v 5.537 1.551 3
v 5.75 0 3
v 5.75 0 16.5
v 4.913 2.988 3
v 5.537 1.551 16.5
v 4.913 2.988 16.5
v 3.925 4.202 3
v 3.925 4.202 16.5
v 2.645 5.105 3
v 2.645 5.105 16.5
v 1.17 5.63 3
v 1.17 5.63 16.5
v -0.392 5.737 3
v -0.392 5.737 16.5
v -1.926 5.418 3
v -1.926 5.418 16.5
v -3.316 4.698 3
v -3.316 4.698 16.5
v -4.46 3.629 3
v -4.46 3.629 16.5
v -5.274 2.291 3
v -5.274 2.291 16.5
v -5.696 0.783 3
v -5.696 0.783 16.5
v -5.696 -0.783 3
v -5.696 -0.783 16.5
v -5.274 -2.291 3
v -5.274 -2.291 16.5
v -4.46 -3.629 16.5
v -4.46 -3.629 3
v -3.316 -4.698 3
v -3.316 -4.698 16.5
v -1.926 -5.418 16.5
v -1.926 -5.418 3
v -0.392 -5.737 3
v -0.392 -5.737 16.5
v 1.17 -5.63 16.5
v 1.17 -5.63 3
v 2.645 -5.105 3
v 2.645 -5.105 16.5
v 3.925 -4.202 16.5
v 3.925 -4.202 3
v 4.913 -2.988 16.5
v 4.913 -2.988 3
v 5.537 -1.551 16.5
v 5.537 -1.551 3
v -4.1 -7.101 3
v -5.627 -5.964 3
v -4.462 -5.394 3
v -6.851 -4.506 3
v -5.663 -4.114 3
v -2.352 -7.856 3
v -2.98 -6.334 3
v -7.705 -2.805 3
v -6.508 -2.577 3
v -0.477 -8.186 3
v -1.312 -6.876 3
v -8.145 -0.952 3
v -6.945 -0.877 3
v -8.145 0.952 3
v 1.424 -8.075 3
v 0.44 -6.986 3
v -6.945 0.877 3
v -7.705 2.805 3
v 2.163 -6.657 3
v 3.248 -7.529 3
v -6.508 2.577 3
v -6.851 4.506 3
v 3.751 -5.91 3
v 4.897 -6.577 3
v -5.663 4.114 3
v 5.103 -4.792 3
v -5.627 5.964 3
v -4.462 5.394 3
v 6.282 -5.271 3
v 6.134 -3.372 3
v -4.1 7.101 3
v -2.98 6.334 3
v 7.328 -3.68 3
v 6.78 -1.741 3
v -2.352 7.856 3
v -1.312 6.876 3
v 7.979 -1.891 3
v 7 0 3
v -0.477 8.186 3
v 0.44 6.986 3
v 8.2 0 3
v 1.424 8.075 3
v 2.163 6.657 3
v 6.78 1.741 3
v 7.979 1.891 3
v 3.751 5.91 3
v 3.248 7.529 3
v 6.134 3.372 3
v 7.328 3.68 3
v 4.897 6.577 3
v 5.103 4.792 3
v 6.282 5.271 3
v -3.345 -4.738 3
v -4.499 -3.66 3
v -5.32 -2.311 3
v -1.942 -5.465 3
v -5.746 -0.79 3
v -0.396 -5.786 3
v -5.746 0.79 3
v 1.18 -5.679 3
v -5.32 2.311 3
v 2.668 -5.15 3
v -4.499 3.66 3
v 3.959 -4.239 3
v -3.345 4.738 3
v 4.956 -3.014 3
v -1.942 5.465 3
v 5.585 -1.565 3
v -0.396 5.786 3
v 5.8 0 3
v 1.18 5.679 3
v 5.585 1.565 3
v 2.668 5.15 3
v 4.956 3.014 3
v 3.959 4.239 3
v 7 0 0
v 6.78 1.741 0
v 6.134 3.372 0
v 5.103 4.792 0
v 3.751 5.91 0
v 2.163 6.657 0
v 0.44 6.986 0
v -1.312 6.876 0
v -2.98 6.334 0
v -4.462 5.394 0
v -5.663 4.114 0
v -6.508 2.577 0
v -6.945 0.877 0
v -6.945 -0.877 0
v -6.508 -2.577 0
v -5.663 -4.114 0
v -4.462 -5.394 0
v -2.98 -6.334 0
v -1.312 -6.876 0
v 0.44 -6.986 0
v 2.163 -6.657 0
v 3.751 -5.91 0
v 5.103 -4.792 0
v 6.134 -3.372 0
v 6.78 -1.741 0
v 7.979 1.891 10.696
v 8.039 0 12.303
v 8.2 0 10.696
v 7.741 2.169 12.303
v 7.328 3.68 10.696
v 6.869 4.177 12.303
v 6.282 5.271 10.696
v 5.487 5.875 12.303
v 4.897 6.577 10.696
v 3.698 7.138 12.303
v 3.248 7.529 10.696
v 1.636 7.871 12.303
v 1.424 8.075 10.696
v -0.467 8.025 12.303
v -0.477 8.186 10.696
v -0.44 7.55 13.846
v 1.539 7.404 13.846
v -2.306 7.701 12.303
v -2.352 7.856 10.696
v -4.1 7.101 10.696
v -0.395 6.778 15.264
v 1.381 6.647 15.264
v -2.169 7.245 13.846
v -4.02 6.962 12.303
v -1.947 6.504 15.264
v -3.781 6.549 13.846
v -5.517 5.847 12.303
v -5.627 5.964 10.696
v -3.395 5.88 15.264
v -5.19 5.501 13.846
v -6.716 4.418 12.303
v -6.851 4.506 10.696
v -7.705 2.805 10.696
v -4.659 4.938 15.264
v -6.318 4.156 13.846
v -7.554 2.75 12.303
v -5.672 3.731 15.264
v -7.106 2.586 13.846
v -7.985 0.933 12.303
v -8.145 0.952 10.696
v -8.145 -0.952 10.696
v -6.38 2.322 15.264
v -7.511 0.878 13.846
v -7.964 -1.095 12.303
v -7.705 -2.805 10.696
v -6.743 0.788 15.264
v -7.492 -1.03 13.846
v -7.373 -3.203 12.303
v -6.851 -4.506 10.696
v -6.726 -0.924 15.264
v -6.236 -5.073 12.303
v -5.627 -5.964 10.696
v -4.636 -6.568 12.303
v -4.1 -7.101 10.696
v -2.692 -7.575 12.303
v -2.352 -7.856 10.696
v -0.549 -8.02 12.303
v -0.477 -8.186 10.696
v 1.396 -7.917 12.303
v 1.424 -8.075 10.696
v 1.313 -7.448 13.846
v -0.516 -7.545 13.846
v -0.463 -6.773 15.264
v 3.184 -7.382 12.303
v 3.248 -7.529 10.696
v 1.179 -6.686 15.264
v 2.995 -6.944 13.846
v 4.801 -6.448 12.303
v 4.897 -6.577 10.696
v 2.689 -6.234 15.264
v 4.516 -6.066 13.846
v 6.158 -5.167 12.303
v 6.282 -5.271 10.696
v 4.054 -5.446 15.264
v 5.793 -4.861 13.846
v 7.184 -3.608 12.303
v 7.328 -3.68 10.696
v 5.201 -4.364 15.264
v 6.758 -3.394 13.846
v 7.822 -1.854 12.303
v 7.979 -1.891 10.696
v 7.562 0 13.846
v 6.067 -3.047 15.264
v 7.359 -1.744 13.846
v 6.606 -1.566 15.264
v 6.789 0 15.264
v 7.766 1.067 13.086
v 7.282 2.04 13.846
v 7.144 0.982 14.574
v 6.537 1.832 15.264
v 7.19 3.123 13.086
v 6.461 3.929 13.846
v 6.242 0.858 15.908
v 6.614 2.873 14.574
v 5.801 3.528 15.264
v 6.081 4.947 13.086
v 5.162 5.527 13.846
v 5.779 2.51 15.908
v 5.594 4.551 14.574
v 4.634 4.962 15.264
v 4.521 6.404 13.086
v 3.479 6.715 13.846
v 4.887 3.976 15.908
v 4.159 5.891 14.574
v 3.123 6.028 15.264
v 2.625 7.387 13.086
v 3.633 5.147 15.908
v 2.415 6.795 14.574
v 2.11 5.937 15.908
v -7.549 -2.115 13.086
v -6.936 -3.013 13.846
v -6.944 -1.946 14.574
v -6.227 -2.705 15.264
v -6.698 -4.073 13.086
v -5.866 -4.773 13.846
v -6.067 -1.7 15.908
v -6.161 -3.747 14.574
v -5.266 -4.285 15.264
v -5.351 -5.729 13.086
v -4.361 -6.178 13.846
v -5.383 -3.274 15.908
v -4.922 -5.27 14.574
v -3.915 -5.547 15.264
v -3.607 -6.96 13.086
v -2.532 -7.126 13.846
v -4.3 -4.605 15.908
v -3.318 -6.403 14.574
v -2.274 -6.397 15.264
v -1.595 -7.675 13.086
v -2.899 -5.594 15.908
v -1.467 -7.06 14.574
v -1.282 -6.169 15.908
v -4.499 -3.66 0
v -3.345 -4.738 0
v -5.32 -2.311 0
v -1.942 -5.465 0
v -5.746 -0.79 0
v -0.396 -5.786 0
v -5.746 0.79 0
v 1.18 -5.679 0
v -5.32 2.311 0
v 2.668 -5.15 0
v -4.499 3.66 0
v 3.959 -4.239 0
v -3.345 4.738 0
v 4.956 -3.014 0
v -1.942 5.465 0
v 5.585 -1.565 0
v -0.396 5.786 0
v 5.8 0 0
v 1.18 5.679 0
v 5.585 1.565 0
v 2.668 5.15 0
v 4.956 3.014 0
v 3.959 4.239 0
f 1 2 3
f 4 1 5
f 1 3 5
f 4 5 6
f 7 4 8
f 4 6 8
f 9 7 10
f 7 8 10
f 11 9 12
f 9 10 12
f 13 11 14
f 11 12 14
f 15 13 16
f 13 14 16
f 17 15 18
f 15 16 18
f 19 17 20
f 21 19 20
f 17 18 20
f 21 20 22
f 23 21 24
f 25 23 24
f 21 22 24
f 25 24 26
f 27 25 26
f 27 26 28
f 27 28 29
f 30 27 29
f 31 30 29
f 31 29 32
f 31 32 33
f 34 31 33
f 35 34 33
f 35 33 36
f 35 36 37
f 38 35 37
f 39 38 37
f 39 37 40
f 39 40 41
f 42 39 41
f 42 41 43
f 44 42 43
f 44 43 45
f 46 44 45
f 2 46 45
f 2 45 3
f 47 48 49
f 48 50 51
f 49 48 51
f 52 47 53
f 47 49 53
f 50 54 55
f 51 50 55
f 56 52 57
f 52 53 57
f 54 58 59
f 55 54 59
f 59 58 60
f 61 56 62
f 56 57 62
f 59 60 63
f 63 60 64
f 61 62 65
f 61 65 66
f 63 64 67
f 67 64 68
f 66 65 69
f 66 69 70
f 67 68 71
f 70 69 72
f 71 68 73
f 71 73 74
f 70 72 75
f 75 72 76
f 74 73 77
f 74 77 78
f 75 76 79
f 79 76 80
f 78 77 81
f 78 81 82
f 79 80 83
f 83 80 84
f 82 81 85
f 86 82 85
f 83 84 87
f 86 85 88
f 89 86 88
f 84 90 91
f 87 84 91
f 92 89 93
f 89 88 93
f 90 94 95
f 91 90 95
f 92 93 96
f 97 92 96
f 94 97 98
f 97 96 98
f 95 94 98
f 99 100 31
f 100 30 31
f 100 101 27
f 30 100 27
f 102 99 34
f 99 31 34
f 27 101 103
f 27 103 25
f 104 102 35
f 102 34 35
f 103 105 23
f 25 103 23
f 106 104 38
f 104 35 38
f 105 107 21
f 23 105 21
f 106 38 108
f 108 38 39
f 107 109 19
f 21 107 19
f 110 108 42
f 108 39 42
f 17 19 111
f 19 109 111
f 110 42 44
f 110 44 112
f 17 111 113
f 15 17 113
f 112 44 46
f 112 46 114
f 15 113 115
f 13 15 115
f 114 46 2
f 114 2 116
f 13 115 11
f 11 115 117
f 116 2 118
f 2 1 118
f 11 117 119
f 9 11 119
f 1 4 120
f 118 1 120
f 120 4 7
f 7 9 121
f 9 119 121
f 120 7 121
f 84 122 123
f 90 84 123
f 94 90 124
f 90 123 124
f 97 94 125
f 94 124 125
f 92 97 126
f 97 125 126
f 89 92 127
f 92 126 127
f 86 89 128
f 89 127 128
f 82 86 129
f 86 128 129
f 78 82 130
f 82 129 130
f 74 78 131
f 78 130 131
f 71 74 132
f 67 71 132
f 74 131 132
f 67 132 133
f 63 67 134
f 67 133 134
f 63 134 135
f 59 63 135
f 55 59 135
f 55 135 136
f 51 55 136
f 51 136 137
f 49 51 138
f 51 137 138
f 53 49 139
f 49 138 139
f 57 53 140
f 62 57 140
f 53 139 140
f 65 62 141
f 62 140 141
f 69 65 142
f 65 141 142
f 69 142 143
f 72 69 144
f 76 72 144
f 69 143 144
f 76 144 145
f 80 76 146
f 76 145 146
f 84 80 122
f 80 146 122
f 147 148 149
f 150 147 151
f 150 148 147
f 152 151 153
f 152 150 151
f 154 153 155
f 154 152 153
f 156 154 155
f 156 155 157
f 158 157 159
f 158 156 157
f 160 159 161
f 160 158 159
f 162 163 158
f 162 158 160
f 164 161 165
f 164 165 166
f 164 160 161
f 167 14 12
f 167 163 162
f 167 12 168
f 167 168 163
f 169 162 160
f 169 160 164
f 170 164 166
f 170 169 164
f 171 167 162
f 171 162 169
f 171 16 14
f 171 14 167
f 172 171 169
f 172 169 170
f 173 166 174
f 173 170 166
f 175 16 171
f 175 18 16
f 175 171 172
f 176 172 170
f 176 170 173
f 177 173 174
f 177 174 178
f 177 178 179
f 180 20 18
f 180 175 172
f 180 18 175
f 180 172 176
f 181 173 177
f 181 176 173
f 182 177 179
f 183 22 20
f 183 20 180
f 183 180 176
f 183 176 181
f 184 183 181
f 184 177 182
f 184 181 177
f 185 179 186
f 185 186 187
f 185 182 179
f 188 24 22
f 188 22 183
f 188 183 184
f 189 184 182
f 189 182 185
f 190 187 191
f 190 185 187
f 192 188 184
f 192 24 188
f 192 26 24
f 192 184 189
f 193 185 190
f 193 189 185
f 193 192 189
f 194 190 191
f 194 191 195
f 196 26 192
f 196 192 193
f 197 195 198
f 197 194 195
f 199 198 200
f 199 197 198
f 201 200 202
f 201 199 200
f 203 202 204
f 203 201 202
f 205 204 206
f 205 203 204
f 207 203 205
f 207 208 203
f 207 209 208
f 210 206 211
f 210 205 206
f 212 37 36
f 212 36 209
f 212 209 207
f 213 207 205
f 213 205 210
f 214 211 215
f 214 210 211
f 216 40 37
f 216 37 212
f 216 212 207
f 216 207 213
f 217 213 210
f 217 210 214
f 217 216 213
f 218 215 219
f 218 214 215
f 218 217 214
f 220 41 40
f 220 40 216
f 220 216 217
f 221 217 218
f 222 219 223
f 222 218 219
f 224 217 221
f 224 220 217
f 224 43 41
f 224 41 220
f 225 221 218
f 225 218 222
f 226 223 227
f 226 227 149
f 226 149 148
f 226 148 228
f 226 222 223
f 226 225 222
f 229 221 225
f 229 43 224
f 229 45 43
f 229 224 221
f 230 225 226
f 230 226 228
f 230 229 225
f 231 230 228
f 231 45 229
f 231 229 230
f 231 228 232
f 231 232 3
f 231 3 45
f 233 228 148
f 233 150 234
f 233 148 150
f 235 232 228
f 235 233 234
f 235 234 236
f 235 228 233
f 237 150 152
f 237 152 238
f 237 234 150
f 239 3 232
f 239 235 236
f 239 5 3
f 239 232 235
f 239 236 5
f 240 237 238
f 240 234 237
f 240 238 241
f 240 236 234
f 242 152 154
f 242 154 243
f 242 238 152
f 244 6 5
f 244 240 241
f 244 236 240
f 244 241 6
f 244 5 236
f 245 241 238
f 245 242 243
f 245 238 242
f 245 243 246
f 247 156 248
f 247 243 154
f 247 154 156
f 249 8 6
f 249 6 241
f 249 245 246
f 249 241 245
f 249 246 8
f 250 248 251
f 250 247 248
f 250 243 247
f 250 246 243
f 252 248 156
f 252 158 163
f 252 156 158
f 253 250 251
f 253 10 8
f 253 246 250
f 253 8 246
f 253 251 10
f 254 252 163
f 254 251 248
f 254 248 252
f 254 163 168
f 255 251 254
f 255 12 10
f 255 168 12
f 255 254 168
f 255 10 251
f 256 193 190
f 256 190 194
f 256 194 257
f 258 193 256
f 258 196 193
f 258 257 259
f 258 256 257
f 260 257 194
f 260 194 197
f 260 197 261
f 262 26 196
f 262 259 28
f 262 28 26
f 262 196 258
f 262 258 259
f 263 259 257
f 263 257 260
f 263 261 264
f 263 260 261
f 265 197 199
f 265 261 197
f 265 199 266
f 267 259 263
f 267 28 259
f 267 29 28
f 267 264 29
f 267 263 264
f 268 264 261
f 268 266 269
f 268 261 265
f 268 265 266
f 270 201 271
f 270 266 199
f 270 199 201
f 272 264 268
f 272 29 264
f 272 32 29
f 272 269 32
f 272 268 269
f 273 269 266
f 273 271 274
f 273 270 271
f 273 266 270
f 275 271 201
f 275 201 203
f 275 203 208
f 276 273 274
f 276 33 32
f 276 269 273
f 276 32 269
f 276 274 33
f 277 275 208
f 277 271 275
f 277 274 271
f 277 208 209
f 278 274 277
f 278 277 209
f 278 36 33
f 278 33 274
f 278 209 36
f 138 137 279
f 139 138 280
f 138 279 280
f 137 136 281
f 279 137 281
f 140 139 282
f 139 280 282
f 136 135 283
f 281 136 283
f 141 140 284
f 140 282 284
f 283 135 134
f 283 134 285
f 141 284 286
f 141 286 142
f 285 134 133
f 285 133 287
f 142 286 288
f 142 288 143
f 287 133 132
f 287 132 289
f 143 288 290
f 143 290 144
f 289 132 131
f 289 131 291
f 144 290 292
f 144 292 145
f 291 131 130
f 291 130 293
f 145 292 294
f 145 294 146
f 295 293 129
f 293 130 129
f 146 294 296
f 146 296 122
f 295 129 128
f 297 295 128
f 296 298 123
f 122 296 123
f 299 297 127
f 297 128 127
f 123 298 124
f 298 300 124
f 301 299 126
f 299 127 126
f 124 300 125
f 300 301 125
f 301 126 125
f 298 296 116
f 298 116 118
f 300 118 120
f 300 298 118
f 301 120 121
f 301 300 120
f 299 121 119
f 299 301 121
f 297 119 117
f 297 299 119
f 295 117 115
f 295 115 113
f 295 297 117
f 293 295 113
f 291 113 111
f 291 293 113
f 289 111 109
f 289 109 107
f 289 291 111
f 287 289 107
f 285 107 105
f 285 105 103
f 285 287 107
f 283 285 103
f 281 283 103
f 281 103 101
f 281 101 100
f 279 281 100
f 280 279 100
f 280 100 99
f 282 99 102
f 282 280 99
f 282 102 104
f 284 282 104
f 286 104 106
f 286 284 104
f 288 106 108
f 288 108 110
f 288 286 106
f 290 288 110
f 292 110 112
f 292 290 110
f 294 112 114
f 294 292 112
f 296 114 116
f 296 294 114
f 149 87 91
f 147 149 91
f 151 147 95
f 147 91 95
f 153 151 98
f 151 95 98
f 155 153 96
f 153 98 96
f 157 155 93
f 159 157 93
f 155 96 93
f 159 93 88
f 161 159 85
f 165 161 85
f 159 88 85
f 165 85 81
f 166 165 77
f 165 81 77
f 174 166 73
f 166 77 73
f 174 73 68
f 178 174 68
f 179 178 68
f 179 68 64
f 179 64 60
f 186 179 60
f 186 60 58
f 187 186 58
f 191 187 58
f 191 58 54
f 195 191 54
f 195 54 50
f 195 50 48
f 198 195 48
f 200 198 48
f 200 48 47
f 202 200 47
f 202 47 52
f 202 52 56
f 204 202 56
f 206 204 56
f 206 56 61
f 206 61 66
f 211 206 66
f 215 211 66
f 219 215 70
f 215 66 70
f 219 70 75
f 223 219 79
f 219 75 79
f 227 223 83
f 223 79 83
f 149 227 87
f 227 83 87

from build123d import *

# Parameters (mm, degrees)
F0_R     = 7
F0_R_2   = 5.8
F1_DEPTH = 3
F2_R     = 8.2
F3_DEPTH = 13.5
F4_R     = 5.75
F5_DEPTH = 16.501


# Not quite as in the source:
# - a fillet or chamfer that OpenCascade refuses, or shapes differently, is made with other operations: its cross-section is extruded or revolved along the edge and cut away or added


with BuildPart() as f1:
    # F0 (on Top) → F1 (new body)
    with BuildSketch(Plane.XY):
        Circle(F0_R)
        Circle(F0_R_2, mode=Mode.SUBTRACT)
    extrude(amount=F1_DEPTH)

    # F2 (on face) → F3 (join)
    with BuildSketch(Plane.XY.offset(3)):
        Circle(F2_R)
    extrude(amount=F3_DEPTH)

    # F4 (on face) → F5 (cut, through all)
    with BuildSketch(Plane.XY.offset(16.5)):
        Circle(F4_R)
    extrude(amount=-F5_DEPTH, mode=Mode.SUBTRACT)

    # F6: fillet of radius 8.1 on 1 edges, made by hand

    # F6_s1 → F6_t2 (revolve, cut)
    with BuildSketch(Plane.XZ):
        with BuildLine():
            ThreePointArc((8.2, 10.6959066169), (7.5624057783, 13.8459066169), (5.75, 16.5))
            Line((5.75, 16.5), (8.2, 16.5))
            Line((8.2, 16.5), (8.2, 10.6959066169))
        make_face()
    revolve(axis=Axis((0, 0, 16.5), (0, 0, 1)), mode=Mode.SUBTRACT)


solid = f1.part
